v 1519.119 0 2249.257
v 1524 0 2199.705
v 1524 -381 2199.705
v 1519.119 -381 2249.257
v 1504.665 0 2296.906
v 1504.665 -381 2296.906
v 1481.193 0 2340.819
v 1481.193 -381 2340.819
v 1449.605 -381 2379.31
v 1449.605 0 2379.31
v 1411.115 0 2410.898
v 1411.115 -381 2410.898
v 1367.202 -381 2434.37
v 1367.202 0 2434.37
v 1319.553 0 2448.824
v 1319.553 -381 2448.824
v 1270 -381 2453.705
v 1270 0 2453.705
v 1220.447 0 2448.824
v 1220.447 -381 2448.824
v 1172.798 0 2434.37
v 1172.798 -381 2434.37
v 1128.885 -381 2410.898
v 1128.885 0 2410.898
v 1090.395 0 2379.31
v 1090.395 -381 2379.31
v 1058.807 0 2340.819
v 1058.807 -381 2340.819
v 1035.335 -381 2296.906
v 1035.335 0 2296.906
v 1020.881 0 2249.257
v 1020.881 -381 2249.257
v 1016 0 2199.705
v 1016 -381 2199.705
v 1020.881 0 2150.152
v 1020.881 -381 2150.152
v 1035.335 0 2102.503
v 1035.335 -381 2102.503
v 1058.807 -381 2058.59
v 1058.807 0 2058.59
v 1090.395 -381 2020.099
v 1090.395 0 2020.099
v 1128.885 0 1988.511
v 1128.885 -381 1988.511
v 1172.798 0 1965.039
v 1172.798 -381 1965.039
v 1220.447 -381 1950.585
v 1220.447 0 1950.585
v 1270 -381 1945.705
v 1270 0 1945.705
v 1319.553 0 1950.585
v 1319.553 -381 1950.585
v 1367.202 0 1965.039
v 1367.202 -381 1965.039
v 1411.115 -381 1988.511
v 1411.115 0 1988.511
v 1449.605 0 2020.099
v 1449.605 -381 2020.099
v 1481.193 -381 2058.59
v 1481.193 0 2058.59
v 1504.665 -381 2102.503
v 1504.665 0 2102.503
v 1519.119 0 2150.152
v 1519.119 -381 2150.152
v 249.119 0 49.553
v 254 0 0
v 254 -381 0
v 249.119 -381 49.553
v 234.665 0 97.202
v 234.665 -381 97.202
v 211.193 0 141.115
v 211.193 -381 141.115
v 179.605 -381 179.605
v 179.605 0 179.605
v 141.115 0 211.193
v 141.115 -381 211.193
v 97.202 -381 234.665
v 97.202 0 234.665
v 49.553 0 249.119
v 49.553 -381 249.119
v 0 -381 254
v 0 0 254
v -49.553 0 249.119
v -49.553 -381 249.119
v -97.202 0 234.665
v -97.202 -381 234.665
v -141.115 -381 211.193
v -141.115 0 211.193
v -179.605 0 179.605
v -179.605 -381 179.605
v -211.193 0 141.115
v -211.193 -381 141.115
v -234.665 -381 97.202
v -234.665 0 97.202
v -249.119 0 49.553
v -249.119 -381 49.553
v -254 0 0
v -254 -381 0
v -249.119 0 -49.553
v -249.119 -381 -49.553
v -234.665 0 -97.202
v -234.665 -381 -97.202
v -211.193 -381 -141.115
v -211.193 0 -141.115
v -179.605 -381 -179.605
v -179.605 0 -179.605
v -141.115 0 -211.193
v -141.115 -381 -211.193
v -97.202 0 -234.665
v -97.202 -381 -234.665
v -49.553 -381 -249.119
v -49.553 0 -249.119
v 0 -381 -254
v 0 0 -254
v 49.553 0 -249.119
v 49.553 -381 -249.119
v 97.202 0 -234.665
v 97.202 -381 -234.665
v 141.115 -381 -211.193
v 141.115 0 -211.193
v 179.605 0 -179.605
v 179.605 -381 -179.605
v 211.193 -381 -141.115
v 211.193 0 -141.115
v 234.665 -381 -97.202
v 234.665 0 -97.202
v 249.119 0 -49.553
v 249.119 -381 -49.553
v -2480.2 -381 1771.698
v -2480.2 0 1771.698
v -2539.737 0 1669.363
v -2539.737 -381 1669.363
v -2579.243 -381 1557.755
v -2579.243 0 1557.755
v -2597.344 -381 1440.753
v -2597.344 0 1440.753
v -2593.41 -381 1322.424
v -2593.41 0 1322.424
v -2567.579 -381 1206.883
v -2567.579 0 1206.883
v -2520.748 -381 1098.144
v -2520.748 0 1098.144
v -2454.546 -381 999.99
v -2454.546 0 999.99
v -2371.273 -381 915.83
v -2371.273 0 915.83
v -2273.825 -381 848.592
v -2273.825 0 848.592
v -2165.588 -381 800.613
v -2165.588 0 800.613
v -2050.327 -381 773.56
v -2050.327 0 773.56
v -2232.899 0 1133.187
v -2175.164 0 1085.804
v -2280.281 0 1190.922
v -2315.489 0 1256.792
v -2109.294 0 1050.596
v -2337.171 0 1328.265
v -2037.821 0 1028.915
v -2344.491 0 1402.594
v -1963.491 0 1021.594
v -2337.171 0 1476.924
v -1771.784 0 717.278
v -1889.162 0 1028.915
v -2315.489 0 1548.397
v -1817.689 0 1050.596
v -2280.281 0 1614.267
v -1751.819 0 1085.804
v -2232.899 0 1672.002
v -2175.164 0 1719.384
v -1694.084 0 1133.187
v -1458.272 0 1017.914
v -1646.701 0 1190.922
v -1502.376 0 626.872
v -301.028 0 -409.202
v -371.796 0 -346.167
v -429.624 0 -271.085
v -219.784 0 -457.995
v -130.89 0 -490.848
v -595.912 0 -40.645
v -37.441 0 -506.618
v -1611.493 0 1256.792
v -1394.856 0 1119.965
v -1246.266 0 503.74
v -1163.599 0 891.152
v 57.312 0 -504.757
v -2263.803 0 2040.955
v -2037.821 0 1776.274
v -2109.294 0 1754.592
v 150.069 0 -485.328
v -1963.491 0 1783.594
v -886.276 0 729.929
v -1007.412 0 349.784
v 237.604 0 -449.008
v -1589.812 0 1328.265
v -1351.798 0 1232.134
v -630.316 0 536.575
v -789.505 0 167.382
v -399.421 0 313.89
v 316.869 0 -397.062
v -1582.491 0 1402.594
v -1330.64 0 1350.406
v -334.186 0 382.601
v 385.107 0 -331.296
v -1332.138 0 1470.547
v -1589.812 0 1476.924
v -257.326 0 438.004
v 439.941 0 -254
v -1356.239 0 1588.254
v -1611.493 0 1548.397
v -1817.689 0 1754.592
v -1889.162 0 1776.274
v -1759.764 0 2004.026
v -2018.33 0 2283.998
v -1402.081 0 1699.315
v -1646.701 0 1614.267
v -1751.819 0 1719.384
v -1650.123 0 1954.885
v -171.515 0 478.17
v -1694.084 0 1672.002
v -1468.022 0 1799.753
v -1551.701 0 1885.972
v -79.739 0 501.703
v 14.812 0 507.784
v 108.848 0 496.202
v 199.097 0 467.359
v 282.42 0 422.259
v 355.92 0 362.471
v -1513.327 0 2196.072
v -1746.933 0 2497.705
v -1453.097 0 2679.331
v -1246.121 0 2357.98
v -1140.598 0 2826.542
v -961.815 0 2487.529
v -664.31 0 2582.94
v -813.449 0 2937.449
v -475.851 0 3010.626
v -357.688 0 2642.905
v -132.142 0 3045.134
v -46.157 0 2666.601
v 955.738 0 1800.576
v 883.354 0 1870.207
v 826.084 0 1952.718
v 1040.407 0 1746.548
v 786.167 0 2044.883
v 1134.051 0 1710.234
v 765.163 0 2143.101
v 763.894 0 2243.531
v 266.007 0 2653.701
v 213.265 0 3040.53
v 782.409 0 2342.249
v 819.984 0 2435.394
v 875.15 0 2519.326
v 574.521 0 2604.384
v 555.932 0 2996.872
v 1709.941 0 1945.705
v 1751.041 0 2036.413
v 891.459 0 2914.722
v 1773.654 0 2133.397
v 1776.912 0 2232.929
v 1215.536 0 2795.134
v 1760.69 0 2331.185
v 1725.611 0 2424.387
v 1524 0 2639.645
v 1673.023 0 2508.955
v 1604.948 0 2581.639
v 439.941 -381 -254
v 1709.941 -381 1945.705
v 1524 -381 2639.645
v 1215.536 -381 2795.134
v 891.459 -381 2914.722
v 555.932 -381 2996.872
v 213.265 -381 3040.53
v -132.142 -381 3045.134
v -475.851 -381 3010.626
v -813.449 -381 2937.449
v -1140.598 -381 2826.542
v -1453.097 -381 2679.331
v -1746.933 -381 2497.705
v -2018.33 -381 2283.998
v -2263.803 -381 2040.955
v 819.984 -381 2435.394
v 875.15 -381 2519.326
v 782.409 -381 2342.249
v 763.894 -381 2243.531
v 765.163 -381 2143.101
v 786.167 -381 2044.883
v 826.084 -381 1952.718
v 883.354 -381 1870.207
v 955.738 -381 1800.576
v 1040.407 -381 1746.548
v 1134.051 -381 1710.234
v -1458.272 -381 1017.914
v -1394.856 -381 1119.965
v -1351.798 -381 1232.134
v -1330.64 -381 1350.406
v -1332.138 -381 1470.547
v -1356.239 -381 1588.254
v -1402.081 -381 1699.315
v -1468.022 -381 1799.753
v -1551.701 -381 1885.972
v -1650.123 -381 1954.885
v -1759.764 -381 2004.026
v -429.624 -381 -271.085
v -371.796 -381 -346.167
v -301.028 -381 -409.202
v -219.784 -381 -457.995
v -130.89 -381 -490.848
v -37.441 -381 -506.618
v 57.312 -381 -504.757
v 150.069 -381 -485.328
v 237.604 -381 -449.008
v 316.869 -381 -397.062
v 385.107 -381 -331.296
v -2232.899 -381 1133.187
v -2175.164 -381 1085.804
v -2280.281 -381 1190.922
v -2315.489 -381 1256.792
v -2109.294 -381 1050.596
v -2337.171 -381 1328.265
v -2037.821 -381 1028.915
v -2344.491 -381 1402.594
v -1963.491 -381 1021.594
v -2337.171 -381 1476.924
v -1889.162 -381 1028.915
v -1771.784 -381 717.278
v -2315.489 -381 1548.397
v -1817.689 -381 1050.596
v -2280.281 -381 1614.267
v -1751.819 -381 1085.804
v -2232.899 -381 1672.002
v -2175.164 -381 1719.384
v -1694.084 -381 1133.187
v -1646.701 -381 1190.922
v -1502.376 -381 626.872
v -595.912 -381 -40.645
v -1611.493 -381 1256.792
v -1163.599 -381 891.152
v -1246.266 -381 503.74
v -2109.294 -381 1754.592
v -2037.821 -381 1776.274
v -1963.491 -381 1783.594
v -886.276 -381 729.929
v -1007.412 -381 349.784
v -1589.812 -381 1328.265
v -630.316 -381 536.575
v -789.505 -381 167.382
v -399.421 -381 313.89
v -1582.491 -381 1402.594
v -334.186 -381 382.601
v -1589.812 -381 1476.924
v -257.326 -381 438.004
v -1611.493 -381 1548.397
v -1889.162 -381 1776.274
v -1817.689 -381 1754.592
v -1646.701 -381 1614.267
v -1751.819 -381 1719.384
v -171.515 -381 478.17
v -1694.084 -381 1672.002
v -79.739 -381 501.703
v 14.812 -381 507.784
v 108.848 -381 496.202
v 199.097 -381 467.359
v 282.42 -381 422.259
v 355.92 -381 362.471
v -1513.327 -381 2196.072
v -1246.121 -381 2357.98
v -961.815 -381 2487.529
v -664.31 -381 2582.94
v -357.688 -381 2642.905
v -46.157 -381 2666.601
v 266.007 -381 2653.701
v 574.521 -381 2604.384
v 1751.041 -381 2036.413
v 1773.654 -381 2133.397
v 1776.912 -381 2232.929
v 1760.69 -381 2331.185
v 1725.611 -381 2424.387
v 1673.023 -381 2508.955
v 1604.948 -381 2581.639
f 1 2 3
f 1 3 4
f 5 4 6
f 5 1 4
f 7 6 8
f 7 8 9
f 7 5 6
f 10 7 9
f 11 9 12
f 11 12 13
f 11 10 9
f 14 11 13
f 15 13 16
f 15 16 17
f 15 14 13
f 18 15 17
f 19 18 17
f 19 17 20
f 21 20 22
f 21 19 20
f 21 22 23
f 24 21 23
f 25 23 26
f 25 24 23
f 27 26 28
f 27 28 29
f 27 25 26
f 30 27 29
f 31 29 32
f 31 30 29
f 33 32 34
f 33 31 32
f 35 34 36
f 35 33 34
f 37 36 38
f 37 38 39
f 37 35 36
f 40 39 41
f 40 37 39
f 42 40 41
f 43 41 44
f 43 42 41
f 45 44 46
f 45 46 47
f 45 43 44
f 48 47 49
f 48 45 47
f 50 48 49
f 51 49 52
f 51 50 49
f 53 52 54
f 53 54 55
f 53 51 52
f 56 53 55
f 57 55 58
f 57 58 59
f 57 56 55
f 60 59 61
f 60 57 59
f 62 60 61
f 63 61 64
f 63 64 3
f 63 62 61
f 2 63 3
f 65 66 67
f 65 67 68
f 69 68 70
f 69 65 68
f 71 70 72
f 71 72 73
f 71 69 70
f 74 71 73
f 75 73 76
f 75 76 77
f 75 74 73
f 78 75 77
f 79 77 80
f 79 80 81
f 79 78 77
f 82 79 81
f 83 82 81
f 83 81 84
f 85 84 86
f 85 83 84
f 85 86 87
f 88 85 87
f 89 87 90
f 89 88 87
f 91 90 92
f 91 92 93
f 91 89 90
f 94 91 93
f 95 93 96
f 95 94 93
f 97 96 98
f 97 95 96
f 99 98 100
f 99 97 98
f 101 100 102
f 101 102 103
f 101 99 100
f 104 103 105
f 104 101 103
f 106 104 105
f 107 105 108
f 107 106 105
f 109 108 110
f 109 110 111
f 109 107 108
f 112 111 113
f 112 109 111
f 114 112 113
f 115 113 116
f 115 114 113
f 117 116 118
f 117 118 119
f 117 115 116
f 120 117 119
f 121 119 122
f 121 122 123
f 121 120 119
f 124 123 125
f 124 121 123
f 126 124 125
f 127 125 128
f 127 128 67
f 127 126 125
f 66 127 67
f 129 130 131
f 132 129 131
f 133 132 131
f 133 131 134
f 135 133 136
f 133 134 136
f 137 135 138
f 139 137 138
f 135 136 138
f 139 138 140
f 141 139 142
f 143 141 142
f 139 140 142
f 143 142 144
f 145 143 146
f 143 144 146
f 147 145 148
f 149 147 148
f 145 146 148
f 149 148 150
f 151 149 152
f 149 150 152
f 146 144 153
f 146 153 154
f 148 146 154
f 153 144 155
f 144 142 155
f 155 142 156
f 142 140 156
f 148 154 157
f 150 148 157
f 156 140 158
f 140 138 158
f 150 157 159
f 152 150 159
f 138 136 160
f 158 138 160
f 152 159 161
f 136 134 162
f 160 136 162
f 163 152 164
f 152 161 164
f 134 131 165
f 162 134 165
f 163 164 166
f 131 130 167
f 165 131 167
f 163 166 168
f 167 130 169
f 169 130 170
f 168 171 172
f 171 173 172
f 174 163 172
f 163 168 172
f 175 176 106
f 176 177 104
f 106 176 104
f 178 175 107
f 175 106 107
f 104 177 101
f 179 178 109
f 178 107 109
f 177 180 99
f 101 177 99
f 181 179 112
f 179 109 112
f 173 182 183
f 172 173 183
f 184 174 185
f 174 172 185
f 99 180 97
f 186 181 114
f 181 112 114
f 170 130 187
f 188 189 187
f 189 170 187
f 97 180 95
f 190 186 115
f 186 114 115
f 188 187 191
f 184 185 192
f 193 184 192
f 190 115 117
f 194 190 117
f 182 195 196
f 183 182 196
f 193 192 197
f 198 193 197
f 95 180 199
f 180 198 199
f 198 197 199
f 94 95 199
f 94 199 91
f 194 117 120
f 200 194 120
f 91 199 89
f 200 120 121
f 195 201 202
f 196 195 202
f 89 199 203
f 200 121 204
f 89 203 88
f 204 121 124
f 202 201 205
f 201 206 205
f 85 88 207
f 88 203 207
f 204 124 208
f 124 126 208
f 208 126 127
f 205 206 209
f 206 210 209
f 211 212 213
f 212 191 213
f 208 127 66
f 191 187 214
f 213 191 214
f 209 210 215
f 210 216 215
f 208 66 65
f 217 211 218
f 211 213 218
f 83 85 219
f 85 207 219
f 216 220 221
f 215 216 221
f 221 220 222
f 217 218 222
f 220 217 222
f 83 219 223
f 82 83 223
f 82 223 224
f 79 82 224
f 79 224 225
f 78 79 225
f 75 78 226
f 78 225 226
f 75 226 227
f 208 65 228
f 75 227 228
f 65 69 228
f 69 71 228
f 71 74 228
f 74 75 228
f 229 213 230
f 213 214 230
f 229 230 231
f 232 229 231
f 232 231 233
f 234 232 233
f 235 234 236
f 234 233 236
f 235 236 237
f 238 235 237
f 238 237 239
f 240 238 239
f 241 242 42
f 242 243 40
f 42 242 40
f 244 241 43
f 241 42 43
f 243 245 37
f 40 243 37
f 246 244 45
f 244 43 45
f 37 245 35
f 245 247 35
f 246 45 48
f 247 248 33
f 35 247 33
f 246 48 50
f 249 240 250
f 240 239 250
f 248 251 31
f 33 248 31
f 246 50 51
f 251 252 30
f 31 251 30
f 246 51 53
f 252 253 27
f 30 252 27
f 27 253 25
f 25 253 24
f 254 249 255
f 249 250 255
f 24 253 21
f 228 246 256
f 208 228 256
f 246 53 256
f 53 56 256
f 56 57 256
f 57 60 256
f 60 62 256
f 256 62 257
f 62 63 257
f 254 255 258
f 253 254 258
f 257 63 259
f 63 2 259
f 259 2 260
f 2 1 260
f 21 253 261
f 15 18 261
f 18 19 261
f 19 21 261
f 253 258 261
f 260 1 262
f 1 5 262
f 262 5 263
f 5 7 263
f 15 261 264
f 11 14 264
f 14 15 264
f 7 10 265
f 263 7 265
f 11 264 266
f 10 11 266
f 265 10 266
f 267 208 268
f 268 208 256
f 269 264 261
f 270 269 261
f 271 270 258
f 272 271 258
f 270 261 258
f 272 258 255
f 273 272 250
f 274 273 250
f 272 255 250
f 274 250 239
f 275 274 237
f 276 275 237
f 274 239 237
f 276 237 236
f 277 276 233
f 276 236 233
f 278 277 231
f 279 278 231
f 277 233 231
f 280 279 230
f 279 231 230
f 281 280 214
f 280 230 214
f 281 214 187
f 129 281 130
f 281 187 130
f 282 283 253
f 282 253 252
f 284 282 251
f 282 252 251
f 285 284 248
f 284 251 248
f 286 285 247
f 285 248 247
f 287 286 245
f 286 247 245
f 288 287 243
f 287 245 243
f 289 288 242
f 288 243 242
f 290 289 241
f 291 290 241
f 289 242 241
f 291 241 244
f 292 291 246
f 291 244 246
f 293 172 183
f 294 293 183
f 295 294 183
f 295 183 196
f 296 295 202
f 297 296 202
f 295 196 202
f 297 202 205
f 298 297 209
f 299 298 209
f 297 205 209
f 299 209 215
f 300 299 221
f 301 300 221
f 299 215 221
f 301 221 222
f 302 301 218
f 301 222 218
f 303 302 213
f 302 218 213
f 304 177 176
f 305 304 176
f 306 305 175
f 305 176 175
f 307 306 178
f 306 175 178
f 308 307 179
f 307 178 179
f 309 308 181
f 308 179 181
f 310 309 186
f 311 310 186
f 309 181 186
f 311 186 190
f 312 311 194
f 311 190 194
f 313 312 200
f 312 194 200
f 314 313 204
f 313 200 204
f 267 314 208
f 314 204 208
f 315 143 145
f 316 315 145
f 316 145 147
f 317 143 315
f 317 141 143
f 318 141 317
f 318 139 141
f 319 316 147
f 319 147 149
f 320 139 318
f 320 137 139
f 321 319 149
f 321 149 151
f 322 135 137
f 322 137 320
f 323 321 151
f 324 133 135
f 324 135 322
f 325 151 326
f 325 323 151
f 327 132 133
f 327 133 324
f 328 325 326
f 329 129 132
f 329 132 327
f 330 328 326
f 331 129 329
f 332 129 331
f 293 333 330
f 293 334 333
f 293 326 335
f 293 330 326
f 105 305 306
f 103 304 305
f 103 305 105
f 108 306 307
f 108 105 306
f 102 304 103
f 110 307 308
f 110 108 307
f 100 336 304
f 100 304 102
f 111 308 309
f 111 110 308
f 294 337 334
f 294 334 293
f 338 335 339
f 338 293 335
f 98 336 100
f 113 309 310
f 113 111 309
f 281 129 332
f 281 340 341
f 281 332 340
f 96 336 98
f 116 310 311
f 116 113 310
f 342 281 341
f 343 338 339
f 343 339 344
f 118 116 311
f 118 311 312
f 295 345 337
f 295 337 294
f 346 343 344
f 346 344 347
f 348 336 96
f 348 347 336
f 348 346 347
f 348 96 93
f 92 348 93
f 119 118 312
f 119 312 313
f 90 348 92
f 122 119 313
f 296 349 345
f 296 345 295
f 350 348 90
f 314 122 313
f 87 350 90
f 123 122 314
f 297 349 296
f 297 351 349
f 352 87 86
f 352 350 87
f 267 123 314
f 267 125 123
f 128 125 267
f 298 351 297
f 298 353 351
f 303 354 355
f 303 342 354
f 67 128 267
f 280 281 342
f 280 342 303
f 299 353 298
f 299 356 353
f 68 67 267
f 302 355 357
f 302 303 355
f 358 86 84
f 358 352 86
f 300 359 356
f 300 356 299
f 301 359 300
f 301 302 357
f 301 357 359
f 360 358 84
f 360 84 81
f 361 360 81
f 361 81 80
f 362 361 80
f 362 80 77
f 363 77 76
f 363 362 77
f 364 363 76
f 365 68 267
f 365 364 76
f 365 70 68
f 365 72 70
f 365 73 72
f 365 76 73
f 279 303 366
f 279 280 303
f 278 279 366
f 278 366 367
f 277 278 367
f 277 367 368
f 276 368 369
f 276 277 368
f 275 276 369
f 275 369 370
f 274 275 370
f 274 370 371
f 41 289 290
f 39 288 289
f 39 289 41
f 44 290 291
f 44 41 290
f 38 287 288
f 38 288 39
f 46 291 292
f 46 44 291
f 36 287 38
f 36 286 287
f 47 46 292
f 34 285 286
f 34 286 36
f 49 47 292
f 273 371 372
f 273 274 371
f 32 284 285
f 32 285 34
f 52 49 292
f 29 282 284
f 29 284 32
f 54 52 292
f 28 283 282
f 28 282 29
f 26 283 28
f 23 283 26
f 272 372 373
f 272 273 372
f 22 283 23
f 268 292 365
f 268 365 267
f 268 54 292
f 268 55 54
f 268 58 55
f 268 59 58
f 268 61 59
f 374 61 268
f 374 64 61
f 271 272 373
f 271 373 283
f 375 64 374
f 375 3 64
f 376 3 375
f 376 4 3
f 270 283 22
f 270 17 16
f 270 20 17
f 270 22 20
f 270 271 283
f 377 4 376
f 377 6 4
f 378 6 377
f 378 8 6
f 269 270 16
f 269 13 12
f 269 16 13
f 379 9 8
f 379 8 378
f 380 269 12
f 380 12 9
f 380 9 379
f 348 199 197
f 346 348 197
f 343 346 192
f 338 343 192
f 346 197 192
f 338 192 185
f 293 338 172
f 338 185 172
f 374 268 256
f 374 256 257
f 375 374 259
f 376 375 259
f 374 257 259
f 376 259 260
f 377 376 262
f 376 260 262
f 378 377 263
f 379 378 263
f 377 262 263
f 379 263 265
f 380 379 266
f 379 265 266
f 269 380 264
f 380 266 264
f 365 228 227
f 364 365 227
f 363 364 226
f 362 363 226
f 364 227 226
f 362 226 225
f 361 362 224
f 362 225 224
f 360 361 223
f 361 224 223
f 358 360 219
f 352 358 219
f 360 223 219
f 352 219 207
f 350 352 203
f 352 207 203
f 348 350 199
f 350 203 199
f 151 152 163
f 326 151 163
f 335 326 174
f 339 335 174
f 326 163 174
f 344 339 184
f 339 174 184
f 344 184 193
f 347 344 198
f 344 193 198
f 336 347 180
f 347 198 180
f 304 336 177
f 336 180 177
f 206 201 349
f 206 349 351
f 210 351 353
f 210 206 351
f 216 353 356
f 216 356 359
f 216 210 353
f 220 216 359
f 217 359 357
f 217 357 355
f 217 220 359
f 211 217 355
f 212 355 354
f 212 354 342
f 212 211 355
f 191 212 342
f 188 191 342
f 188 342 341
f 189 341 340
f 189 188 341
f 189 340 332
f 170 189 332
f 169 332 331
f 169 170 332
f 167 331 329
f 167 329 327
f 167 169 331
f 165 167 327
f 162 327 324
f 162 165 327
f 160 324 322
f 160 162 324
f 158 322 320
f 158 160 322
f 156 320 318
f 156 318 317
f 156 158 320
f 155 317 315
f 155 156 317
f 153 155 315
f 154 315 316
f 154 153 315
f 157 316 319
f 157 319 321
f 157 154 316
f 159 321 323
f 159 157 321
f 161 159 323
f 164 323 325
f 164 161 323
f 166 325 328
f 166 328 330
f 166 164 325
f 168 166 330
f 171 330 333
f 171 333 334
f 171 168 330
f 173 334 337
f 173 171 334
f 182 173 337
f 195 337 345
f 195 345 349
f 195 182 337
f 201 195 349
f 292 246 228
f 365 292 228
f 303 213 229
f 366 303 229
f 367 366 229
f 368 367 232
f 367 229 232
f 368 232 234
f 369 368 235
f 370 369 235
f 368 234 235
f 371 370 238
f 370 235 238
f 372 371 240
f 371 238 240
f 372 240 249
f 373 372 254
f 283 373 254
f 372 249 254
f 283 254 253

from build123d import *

# Parameters (mm, degrees)
F0_R     = 254
F0_R_2   = 381
F1_DEPTH = 381


with BuildPart() as f1:
    # F0 (on Front) → F1 (new body)
    with BuildSketch(Plane.XZ):
        with BuildLine():
            ThreePointArc((1709.940905, 1945.704526), (1760.69032, 2331.184601), (1524, 2639.645431))
            ThreePointArc((1524, 2639.645431), (-645.687662, 2978.823835), (-2480.199573, 1771.698078))
            ThreePointArc((-2480.199573, 1771.698078), (-2546.703406, 1151.419727), (-2050.326779, 773.559651))
            ThreePointArc((-2050.326779, 773.559651), (-1124.444661, 430.47682), (-429.624437, -271.084569))
            ThreePointArc((-429.624437, -271.084569), (9.978878, -507.901981), (439.940905, -254))
            Line((439.940905, -254), (1709.940905, 1945.704526))
        make_face()
        Circle(F0_R, mode=Mode.SUBTRACT)
        with Locations((-1963.491328, 1402.594312)):
            Circle(F0_R_2, mode=Mode.SUBTRACT)
        with BuildLine():
            Line((1134.050784, 1710.233576), (355.919669, 362.47095))
            ThreePointArc((355.919669, 362.47095), (-32.605305, 506.952556), (-399.420709, 313.890262))
            ThreePointArc((-399.420709, 313.890262), (-886.275854, 729.928506), (-1458.272343, 1017.914215))
            ThreePointArc((-1458.272343, 1017.914215), (-1356.238986, 1588.254198), (-1759.76382, 2004.026022))
            ThreePointArc((-1759.76382, 2004.026022), (-511.877657, 2617.416716), (875.150152, 2519.325547))
            ThreePointArc((875.150152, 2519.325547), (786.167006, 2044.883229), (1134.050784, 1710.233576))
        make_face(mode=Mode.SUBTRACT)
        with Locations((1270, 2199.704526)):
            Circle(F0_R, mode=Mode.SUBTRACT)
    extrude(amount=F1_DEPTH)


solid = f1.part
